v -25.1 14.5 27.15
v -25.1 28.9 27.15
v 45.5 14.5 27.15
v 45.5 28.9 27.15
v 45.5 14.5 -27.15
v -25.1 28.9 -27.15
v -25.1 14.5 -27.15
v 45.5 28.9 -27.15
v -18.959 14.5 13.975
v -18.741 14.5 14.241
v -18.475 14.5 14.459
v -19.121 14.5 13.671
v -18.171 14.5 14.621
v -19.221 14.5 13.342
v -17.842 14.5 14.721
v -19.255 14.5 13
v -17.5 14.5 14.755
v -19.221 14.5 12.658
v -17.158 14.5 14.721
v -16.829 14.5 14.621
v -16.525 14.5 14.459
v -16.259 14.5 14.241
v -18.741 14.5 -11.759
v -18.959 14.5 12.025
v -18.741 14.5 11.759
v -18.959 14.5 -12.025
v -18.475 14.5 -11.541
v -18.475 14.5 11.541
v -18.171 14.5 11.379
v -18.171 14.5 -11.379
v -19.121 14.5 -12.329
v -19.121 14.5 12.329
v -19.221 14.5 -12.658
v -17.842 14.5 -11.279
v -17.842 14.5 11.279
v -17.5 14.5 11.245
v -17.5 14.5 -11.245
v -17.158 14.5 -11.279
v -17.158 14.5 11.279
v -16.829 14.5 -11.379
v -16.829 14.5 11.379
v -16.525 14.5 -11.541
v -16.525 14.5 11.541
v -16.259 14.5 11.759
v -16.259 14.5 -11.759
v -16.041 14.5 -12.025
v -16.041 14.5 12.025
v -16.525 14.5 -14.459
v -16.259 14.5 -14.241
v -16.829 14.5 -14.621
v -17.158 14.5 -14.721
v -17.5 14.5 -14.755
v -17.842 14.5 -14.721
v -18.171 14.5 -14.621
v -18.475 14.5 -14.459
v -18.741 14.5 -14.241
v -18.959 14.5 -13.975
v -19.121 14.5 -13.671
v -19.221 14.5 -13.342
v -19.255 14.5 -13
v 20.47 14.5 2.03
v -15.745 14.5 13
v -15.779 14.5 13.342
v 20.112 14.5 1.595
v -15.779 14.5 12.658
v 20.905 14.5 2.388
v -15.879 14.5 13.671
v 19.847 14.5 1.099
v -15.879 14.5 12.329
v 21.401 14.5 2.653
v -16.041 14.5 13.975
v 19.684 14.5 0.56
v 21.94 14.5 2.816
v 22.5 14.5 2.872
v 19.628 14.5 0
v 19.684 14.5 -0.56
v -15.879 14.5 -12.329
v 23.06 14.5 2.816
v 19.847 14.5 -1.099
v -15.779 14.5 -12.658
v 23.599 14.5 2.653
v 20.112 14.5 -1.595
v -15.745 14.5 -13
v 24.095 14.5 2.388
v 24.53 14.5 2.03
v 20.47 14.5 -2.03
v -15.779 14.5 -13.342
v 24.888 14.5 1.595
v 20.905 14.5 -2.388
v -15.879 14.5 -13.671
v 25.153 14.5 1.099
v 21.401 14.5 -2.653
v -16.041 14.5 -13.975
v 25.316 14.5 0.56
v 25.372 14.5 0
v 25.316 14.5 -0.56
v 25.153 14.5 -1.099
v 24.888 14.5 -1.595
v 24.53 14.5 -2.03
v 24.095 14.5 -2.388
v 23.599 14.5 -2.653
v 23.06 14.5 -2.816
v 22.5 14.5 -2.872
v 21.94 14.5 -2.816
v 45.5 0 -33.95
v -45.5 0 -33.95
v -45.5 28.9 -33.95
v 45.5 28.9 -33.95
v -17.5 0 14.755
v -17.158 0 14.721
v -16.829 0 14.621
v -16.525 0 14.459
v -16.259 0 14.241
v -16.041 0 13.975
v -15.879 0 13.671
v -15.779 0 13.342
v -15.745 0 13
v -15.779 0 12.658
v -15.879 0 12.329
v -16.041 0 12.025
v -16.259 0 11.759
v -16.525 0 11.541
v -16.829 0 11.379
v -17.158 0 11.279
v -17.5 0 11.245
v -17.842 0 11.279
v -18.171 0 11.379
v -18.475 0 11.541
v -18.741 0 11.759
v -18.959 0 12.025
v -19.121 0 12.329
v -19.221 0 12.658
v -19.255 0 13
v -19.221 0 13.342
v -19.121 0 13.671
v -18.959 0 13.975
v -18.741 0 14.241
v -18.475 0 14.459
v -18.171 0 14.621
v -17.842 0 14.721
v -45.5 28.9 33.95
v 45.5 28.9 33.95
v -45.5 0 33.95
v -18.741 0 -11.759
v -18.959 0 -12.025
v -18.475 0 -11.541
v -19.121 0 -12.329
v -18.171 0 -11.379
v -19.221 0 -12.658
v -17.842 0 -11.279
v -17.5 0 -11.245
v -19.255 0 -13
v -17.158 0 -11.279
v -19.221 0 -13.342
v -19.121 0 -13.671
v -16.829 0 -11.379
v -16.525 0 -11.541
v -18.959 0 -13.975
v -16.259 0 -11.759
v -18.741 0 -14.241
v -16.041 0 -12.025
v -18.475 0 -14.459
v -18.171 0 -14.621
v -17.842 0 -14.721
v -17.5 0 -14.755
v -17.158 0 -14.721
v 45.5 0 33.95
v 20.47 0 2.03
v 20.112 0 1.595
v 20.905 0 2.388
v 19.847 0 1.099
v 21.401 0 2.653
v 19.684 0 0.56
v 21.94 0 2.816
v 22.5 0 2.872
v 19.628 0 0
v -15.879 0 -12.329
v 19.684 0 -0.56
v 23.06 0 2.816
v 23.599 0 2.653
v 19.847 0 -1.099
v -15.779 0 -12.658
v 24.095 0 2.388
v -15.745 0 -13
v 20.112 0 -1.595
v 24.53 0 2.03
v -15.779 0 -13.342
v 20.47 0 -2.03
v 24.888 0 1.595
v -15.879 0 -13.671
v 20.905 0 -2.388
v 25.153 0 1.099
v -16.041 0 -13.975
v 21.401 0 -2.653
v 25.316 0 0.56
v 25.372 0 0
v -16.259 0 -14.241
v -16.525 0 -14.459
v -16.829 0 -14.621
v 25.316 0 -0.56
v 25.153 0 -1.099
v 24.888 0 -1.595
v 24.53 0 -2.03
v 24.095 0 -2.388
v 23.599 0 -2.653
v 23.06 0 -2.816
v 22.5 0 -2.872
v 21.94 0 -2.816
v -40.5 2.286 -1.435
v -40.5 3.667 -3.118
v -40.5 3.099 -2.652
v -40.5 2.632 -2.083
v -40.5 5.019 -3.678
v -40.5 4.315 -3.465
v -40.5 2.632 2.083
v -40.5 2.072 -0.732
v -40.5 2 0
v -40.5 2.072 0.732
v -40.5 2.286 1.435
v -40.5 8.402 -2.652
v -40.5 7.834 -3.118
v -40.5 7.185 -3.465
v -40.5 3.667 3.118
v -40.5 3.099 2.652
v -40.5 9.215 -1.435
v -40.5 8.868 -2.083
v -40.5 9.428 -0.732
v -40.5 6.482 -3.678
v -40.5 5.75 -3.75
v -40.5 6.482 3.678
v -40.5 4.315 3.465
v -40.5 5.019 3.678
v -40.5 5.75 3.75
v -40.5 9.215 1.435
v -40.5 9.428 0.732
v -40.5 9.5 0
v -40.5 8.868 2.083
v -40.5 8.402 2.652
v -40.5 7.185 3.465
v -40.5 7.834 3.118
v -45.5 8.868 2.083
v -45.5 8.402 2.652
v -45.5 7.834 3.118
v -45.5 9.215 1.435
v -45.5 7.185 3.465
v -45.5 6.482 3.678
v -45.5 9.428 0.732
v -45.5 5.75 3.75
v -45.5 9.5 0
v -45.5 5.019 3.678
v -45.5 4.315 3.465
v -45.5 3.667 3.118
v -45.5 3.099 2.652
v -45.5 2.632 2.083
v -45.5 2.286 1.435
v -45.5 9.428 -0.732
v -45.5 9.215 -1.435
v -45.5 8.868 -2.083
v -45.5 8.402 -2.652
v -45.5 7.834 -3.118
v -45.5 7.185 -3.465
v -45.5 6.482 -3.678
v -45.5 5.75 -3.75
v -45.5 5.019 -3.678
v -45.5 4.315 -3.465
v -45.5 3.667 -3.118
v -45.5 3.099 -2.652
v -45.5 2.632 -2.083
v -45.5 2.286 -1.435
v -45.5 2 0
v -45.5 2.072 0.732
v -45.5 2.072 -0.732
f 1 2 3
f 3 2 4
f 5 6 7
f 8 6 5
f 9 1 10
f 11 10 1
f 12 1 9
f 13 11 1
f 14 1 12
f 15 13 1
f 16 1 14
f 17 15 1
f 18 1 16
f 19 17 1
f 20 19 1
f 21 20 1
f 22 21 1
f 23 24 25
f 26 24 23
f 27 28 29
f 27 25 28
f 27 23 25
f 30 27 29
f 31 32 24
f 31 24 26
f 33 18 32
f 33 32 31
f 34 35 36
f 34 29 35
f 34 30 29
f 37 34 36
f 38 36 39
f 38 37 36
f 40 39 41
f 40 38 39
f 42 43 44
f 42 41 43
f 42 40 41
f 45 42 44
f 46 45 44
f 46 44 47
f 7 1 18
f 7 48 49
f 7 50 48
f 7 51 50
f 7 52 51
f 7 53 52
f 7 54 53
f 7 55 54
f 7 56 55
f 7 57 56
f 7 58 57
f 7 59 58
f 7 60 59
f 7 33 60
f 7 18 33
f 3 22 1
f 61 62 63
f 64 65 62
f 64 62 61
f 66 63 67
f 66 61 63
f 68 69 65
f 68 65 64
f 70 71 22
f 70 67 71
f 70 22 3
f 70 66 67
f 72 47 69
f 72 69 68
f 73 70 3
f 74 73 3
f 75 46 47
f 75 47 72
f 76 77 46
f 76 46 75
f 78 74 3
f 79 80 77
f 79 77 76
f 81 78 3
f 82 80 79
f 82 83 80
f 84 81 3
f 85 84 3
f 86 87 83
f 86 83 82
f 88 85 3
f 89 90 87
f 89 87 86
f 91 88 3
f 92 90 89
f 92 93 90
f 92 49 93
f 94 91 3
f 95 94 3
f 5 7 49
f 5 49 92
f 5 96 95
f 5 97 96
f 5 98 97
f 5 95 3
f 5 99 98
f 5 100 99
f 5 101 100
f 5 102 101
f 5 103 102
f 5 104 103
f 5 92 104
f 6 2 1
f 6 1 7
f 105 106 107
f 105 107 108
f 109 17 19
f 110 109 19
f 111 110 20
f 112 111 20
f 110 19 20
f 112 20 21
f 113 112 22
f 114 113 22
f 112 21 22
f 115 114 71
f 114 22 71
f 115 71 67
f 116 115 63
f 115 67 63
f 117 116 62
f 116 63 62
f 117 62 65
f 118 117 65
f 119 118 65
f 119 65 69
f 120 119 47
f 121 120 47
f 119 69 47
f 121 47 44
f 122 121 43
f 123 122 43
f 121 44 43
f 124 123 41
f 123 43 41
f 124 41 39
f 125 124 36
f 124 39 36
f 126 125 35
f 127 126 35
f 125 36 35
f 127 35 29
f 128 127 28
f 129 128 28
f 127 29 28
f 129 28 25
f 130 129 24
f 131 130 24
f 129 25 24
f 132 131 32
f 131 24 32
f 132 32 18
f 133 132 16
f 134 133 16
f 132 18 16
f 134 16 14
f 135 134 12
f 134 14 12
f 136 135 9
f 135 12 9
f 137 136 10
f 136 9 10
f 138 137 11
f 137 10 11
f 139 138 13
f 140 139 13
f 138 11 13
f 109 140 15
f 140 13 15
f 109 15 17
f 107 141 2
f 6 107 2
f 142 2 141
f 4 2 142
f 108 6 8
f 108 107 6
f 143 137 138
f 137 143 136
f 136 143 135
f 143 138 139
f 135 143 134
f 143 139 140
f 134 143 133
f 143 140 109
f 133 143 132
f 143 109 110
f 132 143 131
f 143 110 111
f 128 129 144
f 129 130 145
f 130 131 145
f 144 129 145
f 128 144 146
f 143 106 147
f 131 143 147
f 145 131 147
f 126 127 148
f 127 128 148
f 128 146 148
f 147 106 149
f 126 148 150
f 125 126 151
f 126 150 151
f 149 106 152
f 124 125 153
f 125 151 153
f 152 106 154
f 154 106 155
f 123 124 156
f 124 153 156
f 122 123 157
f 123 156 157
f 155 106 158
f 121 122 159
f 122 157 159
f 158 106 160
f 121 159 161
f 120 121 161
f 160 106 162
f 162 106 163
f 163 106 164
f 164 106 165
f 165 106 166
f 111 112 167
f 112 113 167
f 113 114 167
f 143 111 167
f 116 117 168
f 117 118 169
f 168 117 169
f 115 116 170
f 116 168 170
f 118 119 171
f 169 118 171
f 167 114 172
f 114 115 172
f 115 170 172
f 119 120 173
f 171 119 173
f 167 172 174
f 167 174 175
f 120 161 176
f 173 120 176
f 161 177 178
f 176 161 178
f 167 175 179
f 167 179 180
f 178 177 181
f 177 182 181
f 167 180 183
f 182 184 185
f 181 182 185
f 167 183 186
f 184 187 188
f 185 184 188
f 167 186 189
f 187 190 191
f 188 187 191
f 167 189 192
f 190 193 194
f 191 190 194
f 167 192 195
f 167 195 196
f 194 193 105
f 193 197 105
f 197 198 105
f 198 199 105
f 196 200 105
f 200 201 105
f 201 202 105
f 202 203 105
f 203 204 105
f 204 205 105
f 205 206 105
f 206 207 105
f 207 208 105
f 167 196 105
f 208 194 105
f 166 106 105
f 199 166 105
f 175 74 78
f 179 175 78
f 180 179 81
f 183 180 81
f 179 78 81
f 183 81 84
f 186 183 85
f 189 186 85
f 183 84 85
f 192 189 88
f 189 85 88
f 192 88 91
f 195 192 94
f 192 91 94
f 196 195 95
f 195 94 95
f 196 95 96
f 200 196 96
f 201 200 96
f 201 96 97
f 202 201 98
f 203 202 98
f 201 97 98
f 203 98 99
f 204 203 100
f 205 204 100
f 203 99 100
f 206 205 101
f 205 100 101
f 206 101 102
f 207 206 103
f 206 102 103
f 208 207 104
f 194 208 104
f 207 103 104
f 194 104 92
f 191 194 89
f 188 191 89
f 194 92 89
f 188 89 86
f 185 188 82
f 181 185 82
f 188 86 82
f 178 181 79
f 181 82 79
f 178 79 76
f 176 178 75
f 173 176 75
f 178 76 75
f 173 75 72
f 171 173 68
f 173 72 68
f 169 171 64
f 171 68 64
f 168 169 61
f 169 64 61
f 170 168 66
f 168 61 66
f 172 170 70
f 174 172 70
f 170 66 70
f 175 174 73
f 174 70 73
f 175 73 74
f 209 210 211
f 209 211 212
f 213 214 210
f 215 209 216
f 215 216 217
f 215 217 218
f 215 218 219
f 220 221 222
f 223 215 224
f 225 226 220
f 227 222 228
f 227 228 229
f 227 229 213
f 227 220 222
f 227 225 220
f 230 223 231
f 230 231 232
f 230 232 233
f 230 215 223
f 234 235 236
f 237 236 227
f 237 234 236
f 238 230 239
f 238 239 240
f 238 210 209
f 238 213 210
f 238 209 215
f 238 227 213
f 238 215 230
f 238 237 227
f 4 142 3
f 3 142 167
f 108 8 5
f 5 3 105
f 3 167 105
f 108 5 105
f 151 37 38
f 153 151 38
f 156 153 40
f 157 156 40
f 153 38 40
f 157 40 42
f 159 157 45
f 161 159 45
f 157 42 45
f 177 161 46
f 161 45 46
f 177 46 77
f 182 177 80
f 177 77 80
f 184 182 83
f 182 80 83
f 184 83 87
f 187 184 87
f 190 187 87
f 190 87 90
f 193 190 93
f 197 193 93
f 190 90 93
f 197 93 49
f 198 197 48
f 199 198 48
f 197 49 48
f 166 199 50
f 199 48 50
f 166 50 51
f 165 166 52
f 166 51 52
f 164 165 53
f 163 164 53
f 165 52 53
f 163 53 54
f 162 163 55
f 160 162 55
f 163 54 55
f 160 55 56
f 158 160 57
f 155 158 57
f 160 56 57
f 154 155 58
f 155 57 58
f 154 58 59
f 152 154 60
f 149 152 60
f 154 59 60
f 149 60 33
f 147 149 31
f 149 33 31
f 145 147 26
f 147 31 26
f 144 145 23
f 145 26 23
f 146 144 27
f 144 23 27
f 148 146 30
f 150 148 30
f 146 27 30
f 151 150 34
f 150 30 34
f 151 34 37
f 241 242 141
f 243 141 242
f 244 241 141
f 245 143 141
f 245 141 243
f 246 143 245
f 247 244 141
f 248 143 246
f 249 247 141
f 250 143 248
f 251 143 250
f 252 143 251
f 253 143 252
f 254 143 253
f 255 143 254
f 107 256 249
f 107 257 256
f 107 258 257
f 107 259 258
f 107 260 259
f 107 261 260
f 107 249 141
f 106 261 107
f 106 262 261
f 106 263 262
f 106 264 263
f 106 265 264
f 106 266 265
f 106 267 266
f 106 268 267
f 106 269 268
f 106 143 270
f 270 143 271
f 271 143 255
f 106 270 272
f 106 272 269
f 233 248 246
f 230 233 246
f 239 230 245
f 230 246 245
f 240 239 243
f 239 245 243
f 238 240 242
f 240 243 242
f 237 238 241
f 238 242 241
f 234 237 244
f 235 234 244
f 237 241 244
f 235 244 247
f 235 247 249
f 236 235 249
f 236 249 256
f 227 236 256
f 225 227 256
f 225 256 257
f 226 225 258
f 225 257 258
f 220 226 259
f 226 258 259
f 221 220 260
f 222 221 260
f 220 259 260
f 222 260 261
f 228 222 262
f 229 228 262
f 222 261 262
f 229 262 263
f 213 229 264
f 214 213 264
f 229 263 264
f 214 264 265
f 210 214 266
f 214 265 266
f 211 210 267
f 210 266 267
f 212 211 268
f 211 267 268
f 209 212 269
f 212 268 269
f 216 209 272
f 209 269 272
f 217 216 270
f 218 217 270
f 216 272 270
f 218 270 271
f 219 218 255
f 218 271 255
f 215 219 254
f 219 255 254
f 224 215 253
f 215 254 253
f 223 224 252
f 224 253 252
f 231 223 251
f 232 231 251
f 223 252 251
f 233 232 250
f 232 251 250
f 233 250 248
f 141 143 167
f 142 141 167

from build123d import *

# Parameters (mm, degrees)
SKETCH1_W           = 91
SKETCH1_H           = 67.9
BOSS_EXTRUDE1_DEPTH = 28.9
SKETCH2_W           = 70.6
SKETCH2_H           = 54.3
CUT_EXTRUDE1_DEPTH  = 14.4
SKETCH3_R           = 3.75
CUT_EXTRUDE2_DEPTH  = 5
SKETCH4_R           = 2.871512345
SKETCH4_R_2         = 1.754658852
CUT_EXTRUDE3_DEPTH  = 14.5


with BuildPart() as part:
    # Sketch1 → Boss-Extrude1 (new body)
    with BuildSketch(Plane(origin=(0, 0, 0), x_dir=(1, 0, 0), z_dir=(0, 1, 0))):
        Rectangle(SKETCH1_W, SKETCH1_H)
    extrude(amount=BOSS_EXTRUDE1_DEPTH)

    # Sketch2 → Cut-Extrude1 (cut)
    with BuildSketch(Plane(origin=(0, 28.9, 0), x_dir=(1, 0, 0), z_dir=(0, 1, 0))):
        with Locations((10.2, 0)):
            Rectangle(SKETCH2_W, SKETCH2_H)
    extrude(amount=-CUT_EXTRUDE1_DEPTH, mode=Mode.SUBTRACT)

    # Sketch3 → Cut-Extrude2 (cut)
    with BuildSketch(Plane.ZY.offset(45.5)):
        with Locations((0, 5.750396788)):
            Circle(SKETCH3_R)
    extrude(amount=-CUT_EXTRUDE2_DEPTH, mode=Mode.SUBTRACT)

    # Sketch4 → Cut-Extrude3 (cut)
    with BuildSketch(Plane(origin=(0, 14.5, 0), x_dir=(1, 0, 0), z_dir=(0, 1, 0))):
        with Locations(Location((22.5, 0, 0), (0, 0, 270))):
            Circle(SKETCH4_R)
        with Locations(Location((-17.5, 13, 0), (0, 0, 270))):
            Circle(SKETCH4_R_2)
        with Locations(Location((-17.5, -13, 0), (0, 0, 270))):
            Circle(SKETCH4_R_2)
    extrude(amount=-CUT_EXTRUDE3_DEPTH, mode=Mode.SUBTRACT)


solid = part.part
